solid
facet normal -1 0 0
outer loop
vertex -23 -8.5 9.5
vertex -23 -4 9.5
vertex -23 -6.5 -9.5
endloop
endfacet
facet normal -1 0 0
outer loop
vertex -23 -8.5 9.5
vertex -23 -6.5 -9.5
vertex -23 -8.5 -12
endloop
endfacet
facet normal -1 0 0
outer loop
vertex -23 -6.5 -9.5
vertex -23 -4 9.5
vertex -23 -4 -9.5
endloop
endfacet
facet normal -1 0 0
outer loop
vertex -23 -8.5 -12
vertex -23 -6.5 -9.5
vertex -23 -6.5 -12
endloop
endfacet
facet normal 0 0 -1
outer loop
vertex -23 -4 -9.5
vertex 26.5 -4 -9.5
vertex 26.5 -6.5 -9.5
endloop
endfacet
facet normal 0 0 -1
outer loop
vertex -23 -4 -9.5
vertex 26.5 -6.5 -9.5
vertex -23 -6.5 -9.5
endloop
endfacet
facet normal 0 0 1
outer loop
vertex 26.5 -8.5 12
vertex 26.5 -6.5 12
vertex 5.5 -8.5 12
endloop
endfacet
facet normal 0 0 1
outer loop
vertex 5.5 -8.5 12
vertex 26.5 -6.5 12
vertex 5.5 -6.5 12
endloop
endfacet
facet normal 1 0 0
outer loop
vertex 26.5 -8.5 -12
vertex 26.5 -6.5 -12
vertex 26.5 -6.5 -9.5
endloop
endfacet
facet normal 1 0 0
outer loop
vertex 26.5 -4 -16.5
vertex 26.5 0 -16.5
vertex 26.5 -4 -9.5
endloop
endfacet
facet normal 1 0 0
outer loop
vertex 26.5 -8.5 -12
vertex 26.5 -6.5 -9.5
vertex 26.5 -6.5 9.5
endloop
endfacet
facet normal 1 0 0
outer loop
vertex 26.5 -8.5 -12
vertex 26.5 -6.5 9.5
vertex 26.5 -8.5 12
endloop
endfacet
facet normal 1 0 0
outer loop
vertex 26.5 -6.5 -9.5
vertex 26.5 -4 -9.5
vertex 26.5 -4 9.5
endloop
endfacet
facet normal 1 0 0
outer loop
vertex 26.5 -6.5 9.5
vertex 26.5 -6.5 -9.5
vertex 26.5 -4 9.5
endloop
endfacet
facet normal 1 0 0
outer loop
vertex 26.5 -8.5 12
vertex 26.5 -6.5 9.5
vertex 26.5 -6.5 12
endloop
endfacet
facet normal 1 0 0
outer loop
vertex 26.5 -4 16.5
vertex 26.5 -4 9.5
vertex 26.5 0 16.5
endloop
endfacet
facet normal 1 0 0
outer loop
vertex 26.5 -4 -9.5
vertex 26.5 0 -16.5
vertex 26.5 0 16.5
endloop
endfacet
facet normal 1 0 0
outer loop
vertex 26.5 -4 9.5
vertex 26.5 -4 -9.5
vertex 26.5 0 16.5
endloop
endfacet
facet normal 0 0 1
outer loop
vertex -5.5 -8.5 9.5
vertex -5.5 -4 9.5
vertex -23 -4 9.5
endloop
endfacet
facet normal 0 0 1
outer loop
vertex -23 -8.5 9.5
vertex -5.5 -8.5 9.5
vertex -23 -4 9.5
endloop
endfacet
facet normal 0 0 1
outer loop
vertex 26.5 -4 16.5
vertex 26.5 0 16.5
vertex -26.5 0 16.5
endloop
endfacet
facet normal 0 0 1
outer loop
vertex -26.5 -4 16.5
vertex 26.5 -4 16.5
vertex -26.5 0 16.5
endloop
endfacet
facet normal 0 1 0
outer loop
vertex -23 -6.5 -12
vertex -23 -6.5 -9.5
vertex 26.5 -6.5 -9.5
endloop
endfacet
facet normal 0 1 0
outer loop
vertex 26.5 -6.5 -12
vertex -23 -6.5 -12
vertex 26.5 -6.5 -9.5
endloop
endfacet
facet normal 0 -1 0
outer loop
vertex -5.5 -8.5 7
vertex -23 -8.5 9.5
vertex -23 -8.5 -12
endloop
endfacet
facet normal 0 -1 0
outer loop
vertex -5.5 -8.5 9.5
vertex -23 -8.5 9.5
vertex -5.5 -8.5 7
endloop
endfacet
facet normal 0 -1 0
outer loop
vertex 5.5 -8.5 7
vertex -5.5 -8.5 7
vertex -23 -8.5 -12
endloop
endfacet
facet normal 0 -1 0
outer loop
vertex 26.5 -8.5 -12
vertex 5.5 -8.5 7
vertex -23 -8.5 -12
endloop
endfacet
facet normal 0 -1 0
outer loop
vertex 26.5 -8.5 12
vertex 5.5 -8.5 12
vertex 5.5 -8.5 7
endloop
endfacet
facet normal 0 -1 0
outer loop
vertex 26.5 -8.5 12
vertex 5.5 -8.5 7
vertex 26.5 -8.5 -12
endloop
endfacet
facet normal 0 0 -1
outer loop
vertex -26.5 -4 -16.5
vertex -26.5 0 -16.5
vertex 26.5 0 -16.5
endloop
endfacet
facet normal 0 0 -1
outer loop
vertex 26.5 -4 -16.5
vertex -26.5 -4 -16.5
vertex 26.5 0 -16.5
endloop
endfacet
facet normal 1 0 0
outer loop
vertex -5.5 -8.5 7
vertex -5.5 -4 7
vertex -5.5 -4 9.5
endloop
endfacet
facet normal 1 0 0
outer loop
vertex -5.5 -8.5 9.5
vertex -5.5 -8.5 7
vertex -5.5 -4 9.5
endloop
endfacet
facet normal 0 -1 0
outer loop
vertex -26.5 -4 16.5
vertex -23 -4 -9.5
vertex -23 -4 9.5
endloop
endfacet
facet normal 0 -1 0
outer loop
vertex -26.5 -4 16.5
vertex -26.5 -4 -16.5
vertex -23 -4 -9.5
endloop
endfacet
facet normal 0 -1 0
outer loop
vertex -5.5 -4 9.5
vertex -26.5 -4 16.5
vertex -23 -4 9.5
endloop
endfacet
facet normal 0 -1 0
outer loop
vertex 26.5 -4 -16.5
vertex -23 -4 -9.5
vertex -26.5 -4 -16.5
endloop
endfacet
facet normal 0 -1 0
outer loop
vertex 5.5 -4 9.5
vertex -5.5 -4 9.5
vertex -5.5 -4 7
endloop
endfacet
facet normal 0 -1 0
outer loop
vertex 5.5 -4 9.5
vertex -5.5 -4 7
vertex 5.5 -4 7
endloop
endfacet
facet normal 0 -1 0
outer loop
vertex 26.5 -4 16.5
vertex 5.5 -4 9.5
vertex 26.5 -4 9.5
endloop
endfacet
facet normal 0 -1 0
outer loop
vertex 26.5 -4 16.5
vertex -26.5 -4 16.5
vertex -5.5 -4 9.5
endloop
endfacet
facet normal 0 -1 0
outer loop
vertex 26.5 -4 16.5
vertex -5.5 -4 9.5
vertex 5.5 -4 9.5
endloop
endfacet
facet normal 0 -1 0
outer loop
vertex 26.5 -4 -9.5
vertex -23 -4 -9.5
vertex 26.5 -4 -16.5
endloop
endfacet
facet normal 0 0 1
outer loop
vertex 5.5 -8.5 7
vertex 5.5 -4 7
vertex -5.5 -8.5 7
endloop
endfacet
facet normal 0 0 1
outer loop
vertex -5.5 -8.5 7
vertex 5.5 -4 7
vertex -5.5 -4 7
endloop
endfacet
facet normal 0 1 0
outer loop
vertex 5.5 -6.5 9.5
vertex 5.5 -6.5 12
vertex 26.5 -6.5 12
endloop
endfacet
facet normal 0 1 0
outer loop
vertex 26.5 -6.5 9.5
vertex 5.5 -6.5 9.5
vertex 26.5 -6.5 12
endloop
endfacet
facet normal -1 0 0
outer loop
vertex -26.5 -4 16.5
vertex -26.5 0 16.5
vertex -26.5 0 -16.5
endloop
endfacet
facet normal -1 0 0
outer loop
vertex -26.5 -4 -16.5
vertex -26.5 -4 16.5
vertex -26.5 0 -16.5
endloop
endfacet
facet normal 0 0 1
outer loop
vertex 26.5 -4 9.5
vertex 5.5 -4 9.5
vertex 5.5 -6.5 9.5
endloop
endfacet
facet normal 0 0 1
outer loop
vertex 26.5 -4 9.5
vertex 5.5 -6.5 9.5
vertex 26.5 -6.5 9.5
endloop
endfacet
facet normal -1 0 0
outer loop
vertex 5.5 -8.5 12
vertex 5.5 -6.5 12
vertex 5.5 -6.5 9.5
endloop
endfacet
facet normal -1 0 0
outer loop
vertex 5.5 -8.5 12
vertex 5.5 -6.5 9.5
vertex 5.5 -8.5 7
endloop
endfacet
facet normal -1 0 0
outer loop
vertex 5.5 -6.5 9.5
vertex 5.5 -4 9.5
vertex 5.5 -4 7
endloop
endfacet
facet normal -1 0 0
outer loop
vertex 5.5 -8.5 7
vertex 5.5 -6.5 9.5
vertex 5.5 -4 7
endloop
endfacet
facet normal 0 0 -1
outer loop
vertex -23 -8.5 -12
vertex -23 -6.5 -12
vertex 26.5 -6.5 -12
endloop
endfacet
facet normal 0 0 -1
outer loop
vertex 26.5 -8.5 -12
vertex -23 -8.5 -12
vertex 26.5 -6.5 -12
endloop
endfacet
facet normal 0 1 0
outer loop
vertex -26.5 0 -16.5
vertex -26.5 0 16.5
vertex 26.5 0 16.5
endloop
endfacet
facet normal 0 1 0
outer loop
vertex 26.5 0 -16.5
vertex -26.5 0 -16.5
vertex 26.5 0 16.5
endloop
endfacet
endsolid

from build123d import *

# Parameters (mm, degrees)
F0_W     = 5.5
F0_H     = 4.5
F0_W_2   = 3.5
F0_H_2   = 2.5
F0_H_3   = 19
F0_W_3   = 11
F1_DEPTH = 4
F0_W_4   = 17.5
F0_W_5   = 46
F2_DEPTH = 8.5
F3_DEPTH = 1
F4_DEPTH = 6.5
F5_DEPTH = 4


with BuildPart() as f1:
    # F0 (on Front) → F1 (new body)
    with BuildSketch(Plane.XZ):
        Polygon((-23, -12), (-26.5, -12), (-26.5, -16.5), (26.5, -16.5), (26.5, -12), (23, -12), align=None)
        with Locations((-2.75, 14.25)):
            Rectangle(F0_W, F0_H)
        with Locations((2.75, 14.25)):
            Rectangle(F0_W, F0_H)
        Polygon((-5.5, 16.5), (-26.5, 16.5), (-26.5, 12), (-23, 12), (-5.5, 12), align=None)
        with Locations((-24.75, 10.75)):
            Rectangle(F0_W_2, F0_H_2)
        with Locations((-24.75, 0)):
            Rectangle(F0_W_2, F0_H_3)
        with Locations((-24.75, -10.75)):
            Rectangle(F0_W_2, F0_H_2)
        Polygon((0, 12), (-5.5, 12), (-5.5, 9.5), (5.5, 9.5), (5.5, 12), align=None)
        with Locations((0, 8.25)):
            Rectangle(F0_W_3, F0_H_2)
        Polygon((26.5, 16.5), (5.5, 16.5), (5.5, 12), (23, 12), (26.5, 12), align=None)
        with Locations((24.75, 10.75)):
            Rectangle(F0_W_2, F0_H_2)
        with Locations((24.75, 0)):
            Rectangle(F0_W_2, F0_H_3)
        with Locations((24.75, -10.75)):
            Rectangle(F0_W_2, F0_H_2)
    extrude(amount=F1_DEPTH)

    # F0 (on Front) → F2 (join)
    with BuildSketch(Plane.XZ):
        Polygon((-5.5, 7), (-5.5, 9.5), (-23, 9.5), (-23, -9.5), (23, -9.5), (23, 9.5), (5.5, 9.5), (5.5, 7), align=None)
        with Locations((14.25, 10.75)):
            Rectangle(F0_W_4, F0_H_2)
        with Locations((0, -10.75)):
            Rectangle(F0_W_5, F0_H_2)
        with Locations((24.75, 10.75)):
            Rectangle(F0_W_2, F0_H_2)
        with Locations((24.75, 0)):
            Rectangle(F0_W_2, F0_H_3)
        with Locations((24.75, -10.75)):
            Rectangle(F0_W_2, F0_H_2)
    extrude(amount=F2_DEPTH)

    # F0 (on Front) → F3 (join)
    with BuildSketch(Plane.XZ):
        with Locations((-2.75, 14.25)):
            Rectangle(F0_W, F0_H)
        with Locations((2.75, 14.25)):
            Rectangle(F0_W, F0_H)
    extrude(amount=F3_DEPTH)

    # F0 (on Front) → F4 (cut)
    with BuildSketch(Plane.XZ):
        with Locations((14.25, 10.75)):
            Rectangle(F0_W_4, F0_H_2)
        with Locations((0, -10.75)):
            Rectangle(F0_W_5, F0_H_2)
        with Locations((24.75, 10.75)):
            Rectangle(F0_W_2, F0_H_2)
        with Locations((24.75, -10.75)):
            Rectangle(F0_W_2, F0_H_2)
    extrude(amount=F4_DEPTH, mode=Mode.SUBTRACT)

    # F0 (on Front) → F5 (join)
    with BuildSketch(Plane.XZ):
        with Locations((14.25, 10.75)):
            Rectangle(F0_W_4, F0_H_2)
        with Locations((-14.25, 10.75)):
            Rectangle(F0_W_4, F0_H_2)
        with Locations((0, -10.75)):
            Rectangle(F0_W_5, F0_H_2)
        with Locations((24.75, 10.75)):
            Rectangle(F0_W_2, F0_H_2)
        with Locations((24.75, -10.75)):
            Rectangle(F0_W_2, F0_H_2)
    extrude(amount=F5_DEPTH)


solid = f1.part
